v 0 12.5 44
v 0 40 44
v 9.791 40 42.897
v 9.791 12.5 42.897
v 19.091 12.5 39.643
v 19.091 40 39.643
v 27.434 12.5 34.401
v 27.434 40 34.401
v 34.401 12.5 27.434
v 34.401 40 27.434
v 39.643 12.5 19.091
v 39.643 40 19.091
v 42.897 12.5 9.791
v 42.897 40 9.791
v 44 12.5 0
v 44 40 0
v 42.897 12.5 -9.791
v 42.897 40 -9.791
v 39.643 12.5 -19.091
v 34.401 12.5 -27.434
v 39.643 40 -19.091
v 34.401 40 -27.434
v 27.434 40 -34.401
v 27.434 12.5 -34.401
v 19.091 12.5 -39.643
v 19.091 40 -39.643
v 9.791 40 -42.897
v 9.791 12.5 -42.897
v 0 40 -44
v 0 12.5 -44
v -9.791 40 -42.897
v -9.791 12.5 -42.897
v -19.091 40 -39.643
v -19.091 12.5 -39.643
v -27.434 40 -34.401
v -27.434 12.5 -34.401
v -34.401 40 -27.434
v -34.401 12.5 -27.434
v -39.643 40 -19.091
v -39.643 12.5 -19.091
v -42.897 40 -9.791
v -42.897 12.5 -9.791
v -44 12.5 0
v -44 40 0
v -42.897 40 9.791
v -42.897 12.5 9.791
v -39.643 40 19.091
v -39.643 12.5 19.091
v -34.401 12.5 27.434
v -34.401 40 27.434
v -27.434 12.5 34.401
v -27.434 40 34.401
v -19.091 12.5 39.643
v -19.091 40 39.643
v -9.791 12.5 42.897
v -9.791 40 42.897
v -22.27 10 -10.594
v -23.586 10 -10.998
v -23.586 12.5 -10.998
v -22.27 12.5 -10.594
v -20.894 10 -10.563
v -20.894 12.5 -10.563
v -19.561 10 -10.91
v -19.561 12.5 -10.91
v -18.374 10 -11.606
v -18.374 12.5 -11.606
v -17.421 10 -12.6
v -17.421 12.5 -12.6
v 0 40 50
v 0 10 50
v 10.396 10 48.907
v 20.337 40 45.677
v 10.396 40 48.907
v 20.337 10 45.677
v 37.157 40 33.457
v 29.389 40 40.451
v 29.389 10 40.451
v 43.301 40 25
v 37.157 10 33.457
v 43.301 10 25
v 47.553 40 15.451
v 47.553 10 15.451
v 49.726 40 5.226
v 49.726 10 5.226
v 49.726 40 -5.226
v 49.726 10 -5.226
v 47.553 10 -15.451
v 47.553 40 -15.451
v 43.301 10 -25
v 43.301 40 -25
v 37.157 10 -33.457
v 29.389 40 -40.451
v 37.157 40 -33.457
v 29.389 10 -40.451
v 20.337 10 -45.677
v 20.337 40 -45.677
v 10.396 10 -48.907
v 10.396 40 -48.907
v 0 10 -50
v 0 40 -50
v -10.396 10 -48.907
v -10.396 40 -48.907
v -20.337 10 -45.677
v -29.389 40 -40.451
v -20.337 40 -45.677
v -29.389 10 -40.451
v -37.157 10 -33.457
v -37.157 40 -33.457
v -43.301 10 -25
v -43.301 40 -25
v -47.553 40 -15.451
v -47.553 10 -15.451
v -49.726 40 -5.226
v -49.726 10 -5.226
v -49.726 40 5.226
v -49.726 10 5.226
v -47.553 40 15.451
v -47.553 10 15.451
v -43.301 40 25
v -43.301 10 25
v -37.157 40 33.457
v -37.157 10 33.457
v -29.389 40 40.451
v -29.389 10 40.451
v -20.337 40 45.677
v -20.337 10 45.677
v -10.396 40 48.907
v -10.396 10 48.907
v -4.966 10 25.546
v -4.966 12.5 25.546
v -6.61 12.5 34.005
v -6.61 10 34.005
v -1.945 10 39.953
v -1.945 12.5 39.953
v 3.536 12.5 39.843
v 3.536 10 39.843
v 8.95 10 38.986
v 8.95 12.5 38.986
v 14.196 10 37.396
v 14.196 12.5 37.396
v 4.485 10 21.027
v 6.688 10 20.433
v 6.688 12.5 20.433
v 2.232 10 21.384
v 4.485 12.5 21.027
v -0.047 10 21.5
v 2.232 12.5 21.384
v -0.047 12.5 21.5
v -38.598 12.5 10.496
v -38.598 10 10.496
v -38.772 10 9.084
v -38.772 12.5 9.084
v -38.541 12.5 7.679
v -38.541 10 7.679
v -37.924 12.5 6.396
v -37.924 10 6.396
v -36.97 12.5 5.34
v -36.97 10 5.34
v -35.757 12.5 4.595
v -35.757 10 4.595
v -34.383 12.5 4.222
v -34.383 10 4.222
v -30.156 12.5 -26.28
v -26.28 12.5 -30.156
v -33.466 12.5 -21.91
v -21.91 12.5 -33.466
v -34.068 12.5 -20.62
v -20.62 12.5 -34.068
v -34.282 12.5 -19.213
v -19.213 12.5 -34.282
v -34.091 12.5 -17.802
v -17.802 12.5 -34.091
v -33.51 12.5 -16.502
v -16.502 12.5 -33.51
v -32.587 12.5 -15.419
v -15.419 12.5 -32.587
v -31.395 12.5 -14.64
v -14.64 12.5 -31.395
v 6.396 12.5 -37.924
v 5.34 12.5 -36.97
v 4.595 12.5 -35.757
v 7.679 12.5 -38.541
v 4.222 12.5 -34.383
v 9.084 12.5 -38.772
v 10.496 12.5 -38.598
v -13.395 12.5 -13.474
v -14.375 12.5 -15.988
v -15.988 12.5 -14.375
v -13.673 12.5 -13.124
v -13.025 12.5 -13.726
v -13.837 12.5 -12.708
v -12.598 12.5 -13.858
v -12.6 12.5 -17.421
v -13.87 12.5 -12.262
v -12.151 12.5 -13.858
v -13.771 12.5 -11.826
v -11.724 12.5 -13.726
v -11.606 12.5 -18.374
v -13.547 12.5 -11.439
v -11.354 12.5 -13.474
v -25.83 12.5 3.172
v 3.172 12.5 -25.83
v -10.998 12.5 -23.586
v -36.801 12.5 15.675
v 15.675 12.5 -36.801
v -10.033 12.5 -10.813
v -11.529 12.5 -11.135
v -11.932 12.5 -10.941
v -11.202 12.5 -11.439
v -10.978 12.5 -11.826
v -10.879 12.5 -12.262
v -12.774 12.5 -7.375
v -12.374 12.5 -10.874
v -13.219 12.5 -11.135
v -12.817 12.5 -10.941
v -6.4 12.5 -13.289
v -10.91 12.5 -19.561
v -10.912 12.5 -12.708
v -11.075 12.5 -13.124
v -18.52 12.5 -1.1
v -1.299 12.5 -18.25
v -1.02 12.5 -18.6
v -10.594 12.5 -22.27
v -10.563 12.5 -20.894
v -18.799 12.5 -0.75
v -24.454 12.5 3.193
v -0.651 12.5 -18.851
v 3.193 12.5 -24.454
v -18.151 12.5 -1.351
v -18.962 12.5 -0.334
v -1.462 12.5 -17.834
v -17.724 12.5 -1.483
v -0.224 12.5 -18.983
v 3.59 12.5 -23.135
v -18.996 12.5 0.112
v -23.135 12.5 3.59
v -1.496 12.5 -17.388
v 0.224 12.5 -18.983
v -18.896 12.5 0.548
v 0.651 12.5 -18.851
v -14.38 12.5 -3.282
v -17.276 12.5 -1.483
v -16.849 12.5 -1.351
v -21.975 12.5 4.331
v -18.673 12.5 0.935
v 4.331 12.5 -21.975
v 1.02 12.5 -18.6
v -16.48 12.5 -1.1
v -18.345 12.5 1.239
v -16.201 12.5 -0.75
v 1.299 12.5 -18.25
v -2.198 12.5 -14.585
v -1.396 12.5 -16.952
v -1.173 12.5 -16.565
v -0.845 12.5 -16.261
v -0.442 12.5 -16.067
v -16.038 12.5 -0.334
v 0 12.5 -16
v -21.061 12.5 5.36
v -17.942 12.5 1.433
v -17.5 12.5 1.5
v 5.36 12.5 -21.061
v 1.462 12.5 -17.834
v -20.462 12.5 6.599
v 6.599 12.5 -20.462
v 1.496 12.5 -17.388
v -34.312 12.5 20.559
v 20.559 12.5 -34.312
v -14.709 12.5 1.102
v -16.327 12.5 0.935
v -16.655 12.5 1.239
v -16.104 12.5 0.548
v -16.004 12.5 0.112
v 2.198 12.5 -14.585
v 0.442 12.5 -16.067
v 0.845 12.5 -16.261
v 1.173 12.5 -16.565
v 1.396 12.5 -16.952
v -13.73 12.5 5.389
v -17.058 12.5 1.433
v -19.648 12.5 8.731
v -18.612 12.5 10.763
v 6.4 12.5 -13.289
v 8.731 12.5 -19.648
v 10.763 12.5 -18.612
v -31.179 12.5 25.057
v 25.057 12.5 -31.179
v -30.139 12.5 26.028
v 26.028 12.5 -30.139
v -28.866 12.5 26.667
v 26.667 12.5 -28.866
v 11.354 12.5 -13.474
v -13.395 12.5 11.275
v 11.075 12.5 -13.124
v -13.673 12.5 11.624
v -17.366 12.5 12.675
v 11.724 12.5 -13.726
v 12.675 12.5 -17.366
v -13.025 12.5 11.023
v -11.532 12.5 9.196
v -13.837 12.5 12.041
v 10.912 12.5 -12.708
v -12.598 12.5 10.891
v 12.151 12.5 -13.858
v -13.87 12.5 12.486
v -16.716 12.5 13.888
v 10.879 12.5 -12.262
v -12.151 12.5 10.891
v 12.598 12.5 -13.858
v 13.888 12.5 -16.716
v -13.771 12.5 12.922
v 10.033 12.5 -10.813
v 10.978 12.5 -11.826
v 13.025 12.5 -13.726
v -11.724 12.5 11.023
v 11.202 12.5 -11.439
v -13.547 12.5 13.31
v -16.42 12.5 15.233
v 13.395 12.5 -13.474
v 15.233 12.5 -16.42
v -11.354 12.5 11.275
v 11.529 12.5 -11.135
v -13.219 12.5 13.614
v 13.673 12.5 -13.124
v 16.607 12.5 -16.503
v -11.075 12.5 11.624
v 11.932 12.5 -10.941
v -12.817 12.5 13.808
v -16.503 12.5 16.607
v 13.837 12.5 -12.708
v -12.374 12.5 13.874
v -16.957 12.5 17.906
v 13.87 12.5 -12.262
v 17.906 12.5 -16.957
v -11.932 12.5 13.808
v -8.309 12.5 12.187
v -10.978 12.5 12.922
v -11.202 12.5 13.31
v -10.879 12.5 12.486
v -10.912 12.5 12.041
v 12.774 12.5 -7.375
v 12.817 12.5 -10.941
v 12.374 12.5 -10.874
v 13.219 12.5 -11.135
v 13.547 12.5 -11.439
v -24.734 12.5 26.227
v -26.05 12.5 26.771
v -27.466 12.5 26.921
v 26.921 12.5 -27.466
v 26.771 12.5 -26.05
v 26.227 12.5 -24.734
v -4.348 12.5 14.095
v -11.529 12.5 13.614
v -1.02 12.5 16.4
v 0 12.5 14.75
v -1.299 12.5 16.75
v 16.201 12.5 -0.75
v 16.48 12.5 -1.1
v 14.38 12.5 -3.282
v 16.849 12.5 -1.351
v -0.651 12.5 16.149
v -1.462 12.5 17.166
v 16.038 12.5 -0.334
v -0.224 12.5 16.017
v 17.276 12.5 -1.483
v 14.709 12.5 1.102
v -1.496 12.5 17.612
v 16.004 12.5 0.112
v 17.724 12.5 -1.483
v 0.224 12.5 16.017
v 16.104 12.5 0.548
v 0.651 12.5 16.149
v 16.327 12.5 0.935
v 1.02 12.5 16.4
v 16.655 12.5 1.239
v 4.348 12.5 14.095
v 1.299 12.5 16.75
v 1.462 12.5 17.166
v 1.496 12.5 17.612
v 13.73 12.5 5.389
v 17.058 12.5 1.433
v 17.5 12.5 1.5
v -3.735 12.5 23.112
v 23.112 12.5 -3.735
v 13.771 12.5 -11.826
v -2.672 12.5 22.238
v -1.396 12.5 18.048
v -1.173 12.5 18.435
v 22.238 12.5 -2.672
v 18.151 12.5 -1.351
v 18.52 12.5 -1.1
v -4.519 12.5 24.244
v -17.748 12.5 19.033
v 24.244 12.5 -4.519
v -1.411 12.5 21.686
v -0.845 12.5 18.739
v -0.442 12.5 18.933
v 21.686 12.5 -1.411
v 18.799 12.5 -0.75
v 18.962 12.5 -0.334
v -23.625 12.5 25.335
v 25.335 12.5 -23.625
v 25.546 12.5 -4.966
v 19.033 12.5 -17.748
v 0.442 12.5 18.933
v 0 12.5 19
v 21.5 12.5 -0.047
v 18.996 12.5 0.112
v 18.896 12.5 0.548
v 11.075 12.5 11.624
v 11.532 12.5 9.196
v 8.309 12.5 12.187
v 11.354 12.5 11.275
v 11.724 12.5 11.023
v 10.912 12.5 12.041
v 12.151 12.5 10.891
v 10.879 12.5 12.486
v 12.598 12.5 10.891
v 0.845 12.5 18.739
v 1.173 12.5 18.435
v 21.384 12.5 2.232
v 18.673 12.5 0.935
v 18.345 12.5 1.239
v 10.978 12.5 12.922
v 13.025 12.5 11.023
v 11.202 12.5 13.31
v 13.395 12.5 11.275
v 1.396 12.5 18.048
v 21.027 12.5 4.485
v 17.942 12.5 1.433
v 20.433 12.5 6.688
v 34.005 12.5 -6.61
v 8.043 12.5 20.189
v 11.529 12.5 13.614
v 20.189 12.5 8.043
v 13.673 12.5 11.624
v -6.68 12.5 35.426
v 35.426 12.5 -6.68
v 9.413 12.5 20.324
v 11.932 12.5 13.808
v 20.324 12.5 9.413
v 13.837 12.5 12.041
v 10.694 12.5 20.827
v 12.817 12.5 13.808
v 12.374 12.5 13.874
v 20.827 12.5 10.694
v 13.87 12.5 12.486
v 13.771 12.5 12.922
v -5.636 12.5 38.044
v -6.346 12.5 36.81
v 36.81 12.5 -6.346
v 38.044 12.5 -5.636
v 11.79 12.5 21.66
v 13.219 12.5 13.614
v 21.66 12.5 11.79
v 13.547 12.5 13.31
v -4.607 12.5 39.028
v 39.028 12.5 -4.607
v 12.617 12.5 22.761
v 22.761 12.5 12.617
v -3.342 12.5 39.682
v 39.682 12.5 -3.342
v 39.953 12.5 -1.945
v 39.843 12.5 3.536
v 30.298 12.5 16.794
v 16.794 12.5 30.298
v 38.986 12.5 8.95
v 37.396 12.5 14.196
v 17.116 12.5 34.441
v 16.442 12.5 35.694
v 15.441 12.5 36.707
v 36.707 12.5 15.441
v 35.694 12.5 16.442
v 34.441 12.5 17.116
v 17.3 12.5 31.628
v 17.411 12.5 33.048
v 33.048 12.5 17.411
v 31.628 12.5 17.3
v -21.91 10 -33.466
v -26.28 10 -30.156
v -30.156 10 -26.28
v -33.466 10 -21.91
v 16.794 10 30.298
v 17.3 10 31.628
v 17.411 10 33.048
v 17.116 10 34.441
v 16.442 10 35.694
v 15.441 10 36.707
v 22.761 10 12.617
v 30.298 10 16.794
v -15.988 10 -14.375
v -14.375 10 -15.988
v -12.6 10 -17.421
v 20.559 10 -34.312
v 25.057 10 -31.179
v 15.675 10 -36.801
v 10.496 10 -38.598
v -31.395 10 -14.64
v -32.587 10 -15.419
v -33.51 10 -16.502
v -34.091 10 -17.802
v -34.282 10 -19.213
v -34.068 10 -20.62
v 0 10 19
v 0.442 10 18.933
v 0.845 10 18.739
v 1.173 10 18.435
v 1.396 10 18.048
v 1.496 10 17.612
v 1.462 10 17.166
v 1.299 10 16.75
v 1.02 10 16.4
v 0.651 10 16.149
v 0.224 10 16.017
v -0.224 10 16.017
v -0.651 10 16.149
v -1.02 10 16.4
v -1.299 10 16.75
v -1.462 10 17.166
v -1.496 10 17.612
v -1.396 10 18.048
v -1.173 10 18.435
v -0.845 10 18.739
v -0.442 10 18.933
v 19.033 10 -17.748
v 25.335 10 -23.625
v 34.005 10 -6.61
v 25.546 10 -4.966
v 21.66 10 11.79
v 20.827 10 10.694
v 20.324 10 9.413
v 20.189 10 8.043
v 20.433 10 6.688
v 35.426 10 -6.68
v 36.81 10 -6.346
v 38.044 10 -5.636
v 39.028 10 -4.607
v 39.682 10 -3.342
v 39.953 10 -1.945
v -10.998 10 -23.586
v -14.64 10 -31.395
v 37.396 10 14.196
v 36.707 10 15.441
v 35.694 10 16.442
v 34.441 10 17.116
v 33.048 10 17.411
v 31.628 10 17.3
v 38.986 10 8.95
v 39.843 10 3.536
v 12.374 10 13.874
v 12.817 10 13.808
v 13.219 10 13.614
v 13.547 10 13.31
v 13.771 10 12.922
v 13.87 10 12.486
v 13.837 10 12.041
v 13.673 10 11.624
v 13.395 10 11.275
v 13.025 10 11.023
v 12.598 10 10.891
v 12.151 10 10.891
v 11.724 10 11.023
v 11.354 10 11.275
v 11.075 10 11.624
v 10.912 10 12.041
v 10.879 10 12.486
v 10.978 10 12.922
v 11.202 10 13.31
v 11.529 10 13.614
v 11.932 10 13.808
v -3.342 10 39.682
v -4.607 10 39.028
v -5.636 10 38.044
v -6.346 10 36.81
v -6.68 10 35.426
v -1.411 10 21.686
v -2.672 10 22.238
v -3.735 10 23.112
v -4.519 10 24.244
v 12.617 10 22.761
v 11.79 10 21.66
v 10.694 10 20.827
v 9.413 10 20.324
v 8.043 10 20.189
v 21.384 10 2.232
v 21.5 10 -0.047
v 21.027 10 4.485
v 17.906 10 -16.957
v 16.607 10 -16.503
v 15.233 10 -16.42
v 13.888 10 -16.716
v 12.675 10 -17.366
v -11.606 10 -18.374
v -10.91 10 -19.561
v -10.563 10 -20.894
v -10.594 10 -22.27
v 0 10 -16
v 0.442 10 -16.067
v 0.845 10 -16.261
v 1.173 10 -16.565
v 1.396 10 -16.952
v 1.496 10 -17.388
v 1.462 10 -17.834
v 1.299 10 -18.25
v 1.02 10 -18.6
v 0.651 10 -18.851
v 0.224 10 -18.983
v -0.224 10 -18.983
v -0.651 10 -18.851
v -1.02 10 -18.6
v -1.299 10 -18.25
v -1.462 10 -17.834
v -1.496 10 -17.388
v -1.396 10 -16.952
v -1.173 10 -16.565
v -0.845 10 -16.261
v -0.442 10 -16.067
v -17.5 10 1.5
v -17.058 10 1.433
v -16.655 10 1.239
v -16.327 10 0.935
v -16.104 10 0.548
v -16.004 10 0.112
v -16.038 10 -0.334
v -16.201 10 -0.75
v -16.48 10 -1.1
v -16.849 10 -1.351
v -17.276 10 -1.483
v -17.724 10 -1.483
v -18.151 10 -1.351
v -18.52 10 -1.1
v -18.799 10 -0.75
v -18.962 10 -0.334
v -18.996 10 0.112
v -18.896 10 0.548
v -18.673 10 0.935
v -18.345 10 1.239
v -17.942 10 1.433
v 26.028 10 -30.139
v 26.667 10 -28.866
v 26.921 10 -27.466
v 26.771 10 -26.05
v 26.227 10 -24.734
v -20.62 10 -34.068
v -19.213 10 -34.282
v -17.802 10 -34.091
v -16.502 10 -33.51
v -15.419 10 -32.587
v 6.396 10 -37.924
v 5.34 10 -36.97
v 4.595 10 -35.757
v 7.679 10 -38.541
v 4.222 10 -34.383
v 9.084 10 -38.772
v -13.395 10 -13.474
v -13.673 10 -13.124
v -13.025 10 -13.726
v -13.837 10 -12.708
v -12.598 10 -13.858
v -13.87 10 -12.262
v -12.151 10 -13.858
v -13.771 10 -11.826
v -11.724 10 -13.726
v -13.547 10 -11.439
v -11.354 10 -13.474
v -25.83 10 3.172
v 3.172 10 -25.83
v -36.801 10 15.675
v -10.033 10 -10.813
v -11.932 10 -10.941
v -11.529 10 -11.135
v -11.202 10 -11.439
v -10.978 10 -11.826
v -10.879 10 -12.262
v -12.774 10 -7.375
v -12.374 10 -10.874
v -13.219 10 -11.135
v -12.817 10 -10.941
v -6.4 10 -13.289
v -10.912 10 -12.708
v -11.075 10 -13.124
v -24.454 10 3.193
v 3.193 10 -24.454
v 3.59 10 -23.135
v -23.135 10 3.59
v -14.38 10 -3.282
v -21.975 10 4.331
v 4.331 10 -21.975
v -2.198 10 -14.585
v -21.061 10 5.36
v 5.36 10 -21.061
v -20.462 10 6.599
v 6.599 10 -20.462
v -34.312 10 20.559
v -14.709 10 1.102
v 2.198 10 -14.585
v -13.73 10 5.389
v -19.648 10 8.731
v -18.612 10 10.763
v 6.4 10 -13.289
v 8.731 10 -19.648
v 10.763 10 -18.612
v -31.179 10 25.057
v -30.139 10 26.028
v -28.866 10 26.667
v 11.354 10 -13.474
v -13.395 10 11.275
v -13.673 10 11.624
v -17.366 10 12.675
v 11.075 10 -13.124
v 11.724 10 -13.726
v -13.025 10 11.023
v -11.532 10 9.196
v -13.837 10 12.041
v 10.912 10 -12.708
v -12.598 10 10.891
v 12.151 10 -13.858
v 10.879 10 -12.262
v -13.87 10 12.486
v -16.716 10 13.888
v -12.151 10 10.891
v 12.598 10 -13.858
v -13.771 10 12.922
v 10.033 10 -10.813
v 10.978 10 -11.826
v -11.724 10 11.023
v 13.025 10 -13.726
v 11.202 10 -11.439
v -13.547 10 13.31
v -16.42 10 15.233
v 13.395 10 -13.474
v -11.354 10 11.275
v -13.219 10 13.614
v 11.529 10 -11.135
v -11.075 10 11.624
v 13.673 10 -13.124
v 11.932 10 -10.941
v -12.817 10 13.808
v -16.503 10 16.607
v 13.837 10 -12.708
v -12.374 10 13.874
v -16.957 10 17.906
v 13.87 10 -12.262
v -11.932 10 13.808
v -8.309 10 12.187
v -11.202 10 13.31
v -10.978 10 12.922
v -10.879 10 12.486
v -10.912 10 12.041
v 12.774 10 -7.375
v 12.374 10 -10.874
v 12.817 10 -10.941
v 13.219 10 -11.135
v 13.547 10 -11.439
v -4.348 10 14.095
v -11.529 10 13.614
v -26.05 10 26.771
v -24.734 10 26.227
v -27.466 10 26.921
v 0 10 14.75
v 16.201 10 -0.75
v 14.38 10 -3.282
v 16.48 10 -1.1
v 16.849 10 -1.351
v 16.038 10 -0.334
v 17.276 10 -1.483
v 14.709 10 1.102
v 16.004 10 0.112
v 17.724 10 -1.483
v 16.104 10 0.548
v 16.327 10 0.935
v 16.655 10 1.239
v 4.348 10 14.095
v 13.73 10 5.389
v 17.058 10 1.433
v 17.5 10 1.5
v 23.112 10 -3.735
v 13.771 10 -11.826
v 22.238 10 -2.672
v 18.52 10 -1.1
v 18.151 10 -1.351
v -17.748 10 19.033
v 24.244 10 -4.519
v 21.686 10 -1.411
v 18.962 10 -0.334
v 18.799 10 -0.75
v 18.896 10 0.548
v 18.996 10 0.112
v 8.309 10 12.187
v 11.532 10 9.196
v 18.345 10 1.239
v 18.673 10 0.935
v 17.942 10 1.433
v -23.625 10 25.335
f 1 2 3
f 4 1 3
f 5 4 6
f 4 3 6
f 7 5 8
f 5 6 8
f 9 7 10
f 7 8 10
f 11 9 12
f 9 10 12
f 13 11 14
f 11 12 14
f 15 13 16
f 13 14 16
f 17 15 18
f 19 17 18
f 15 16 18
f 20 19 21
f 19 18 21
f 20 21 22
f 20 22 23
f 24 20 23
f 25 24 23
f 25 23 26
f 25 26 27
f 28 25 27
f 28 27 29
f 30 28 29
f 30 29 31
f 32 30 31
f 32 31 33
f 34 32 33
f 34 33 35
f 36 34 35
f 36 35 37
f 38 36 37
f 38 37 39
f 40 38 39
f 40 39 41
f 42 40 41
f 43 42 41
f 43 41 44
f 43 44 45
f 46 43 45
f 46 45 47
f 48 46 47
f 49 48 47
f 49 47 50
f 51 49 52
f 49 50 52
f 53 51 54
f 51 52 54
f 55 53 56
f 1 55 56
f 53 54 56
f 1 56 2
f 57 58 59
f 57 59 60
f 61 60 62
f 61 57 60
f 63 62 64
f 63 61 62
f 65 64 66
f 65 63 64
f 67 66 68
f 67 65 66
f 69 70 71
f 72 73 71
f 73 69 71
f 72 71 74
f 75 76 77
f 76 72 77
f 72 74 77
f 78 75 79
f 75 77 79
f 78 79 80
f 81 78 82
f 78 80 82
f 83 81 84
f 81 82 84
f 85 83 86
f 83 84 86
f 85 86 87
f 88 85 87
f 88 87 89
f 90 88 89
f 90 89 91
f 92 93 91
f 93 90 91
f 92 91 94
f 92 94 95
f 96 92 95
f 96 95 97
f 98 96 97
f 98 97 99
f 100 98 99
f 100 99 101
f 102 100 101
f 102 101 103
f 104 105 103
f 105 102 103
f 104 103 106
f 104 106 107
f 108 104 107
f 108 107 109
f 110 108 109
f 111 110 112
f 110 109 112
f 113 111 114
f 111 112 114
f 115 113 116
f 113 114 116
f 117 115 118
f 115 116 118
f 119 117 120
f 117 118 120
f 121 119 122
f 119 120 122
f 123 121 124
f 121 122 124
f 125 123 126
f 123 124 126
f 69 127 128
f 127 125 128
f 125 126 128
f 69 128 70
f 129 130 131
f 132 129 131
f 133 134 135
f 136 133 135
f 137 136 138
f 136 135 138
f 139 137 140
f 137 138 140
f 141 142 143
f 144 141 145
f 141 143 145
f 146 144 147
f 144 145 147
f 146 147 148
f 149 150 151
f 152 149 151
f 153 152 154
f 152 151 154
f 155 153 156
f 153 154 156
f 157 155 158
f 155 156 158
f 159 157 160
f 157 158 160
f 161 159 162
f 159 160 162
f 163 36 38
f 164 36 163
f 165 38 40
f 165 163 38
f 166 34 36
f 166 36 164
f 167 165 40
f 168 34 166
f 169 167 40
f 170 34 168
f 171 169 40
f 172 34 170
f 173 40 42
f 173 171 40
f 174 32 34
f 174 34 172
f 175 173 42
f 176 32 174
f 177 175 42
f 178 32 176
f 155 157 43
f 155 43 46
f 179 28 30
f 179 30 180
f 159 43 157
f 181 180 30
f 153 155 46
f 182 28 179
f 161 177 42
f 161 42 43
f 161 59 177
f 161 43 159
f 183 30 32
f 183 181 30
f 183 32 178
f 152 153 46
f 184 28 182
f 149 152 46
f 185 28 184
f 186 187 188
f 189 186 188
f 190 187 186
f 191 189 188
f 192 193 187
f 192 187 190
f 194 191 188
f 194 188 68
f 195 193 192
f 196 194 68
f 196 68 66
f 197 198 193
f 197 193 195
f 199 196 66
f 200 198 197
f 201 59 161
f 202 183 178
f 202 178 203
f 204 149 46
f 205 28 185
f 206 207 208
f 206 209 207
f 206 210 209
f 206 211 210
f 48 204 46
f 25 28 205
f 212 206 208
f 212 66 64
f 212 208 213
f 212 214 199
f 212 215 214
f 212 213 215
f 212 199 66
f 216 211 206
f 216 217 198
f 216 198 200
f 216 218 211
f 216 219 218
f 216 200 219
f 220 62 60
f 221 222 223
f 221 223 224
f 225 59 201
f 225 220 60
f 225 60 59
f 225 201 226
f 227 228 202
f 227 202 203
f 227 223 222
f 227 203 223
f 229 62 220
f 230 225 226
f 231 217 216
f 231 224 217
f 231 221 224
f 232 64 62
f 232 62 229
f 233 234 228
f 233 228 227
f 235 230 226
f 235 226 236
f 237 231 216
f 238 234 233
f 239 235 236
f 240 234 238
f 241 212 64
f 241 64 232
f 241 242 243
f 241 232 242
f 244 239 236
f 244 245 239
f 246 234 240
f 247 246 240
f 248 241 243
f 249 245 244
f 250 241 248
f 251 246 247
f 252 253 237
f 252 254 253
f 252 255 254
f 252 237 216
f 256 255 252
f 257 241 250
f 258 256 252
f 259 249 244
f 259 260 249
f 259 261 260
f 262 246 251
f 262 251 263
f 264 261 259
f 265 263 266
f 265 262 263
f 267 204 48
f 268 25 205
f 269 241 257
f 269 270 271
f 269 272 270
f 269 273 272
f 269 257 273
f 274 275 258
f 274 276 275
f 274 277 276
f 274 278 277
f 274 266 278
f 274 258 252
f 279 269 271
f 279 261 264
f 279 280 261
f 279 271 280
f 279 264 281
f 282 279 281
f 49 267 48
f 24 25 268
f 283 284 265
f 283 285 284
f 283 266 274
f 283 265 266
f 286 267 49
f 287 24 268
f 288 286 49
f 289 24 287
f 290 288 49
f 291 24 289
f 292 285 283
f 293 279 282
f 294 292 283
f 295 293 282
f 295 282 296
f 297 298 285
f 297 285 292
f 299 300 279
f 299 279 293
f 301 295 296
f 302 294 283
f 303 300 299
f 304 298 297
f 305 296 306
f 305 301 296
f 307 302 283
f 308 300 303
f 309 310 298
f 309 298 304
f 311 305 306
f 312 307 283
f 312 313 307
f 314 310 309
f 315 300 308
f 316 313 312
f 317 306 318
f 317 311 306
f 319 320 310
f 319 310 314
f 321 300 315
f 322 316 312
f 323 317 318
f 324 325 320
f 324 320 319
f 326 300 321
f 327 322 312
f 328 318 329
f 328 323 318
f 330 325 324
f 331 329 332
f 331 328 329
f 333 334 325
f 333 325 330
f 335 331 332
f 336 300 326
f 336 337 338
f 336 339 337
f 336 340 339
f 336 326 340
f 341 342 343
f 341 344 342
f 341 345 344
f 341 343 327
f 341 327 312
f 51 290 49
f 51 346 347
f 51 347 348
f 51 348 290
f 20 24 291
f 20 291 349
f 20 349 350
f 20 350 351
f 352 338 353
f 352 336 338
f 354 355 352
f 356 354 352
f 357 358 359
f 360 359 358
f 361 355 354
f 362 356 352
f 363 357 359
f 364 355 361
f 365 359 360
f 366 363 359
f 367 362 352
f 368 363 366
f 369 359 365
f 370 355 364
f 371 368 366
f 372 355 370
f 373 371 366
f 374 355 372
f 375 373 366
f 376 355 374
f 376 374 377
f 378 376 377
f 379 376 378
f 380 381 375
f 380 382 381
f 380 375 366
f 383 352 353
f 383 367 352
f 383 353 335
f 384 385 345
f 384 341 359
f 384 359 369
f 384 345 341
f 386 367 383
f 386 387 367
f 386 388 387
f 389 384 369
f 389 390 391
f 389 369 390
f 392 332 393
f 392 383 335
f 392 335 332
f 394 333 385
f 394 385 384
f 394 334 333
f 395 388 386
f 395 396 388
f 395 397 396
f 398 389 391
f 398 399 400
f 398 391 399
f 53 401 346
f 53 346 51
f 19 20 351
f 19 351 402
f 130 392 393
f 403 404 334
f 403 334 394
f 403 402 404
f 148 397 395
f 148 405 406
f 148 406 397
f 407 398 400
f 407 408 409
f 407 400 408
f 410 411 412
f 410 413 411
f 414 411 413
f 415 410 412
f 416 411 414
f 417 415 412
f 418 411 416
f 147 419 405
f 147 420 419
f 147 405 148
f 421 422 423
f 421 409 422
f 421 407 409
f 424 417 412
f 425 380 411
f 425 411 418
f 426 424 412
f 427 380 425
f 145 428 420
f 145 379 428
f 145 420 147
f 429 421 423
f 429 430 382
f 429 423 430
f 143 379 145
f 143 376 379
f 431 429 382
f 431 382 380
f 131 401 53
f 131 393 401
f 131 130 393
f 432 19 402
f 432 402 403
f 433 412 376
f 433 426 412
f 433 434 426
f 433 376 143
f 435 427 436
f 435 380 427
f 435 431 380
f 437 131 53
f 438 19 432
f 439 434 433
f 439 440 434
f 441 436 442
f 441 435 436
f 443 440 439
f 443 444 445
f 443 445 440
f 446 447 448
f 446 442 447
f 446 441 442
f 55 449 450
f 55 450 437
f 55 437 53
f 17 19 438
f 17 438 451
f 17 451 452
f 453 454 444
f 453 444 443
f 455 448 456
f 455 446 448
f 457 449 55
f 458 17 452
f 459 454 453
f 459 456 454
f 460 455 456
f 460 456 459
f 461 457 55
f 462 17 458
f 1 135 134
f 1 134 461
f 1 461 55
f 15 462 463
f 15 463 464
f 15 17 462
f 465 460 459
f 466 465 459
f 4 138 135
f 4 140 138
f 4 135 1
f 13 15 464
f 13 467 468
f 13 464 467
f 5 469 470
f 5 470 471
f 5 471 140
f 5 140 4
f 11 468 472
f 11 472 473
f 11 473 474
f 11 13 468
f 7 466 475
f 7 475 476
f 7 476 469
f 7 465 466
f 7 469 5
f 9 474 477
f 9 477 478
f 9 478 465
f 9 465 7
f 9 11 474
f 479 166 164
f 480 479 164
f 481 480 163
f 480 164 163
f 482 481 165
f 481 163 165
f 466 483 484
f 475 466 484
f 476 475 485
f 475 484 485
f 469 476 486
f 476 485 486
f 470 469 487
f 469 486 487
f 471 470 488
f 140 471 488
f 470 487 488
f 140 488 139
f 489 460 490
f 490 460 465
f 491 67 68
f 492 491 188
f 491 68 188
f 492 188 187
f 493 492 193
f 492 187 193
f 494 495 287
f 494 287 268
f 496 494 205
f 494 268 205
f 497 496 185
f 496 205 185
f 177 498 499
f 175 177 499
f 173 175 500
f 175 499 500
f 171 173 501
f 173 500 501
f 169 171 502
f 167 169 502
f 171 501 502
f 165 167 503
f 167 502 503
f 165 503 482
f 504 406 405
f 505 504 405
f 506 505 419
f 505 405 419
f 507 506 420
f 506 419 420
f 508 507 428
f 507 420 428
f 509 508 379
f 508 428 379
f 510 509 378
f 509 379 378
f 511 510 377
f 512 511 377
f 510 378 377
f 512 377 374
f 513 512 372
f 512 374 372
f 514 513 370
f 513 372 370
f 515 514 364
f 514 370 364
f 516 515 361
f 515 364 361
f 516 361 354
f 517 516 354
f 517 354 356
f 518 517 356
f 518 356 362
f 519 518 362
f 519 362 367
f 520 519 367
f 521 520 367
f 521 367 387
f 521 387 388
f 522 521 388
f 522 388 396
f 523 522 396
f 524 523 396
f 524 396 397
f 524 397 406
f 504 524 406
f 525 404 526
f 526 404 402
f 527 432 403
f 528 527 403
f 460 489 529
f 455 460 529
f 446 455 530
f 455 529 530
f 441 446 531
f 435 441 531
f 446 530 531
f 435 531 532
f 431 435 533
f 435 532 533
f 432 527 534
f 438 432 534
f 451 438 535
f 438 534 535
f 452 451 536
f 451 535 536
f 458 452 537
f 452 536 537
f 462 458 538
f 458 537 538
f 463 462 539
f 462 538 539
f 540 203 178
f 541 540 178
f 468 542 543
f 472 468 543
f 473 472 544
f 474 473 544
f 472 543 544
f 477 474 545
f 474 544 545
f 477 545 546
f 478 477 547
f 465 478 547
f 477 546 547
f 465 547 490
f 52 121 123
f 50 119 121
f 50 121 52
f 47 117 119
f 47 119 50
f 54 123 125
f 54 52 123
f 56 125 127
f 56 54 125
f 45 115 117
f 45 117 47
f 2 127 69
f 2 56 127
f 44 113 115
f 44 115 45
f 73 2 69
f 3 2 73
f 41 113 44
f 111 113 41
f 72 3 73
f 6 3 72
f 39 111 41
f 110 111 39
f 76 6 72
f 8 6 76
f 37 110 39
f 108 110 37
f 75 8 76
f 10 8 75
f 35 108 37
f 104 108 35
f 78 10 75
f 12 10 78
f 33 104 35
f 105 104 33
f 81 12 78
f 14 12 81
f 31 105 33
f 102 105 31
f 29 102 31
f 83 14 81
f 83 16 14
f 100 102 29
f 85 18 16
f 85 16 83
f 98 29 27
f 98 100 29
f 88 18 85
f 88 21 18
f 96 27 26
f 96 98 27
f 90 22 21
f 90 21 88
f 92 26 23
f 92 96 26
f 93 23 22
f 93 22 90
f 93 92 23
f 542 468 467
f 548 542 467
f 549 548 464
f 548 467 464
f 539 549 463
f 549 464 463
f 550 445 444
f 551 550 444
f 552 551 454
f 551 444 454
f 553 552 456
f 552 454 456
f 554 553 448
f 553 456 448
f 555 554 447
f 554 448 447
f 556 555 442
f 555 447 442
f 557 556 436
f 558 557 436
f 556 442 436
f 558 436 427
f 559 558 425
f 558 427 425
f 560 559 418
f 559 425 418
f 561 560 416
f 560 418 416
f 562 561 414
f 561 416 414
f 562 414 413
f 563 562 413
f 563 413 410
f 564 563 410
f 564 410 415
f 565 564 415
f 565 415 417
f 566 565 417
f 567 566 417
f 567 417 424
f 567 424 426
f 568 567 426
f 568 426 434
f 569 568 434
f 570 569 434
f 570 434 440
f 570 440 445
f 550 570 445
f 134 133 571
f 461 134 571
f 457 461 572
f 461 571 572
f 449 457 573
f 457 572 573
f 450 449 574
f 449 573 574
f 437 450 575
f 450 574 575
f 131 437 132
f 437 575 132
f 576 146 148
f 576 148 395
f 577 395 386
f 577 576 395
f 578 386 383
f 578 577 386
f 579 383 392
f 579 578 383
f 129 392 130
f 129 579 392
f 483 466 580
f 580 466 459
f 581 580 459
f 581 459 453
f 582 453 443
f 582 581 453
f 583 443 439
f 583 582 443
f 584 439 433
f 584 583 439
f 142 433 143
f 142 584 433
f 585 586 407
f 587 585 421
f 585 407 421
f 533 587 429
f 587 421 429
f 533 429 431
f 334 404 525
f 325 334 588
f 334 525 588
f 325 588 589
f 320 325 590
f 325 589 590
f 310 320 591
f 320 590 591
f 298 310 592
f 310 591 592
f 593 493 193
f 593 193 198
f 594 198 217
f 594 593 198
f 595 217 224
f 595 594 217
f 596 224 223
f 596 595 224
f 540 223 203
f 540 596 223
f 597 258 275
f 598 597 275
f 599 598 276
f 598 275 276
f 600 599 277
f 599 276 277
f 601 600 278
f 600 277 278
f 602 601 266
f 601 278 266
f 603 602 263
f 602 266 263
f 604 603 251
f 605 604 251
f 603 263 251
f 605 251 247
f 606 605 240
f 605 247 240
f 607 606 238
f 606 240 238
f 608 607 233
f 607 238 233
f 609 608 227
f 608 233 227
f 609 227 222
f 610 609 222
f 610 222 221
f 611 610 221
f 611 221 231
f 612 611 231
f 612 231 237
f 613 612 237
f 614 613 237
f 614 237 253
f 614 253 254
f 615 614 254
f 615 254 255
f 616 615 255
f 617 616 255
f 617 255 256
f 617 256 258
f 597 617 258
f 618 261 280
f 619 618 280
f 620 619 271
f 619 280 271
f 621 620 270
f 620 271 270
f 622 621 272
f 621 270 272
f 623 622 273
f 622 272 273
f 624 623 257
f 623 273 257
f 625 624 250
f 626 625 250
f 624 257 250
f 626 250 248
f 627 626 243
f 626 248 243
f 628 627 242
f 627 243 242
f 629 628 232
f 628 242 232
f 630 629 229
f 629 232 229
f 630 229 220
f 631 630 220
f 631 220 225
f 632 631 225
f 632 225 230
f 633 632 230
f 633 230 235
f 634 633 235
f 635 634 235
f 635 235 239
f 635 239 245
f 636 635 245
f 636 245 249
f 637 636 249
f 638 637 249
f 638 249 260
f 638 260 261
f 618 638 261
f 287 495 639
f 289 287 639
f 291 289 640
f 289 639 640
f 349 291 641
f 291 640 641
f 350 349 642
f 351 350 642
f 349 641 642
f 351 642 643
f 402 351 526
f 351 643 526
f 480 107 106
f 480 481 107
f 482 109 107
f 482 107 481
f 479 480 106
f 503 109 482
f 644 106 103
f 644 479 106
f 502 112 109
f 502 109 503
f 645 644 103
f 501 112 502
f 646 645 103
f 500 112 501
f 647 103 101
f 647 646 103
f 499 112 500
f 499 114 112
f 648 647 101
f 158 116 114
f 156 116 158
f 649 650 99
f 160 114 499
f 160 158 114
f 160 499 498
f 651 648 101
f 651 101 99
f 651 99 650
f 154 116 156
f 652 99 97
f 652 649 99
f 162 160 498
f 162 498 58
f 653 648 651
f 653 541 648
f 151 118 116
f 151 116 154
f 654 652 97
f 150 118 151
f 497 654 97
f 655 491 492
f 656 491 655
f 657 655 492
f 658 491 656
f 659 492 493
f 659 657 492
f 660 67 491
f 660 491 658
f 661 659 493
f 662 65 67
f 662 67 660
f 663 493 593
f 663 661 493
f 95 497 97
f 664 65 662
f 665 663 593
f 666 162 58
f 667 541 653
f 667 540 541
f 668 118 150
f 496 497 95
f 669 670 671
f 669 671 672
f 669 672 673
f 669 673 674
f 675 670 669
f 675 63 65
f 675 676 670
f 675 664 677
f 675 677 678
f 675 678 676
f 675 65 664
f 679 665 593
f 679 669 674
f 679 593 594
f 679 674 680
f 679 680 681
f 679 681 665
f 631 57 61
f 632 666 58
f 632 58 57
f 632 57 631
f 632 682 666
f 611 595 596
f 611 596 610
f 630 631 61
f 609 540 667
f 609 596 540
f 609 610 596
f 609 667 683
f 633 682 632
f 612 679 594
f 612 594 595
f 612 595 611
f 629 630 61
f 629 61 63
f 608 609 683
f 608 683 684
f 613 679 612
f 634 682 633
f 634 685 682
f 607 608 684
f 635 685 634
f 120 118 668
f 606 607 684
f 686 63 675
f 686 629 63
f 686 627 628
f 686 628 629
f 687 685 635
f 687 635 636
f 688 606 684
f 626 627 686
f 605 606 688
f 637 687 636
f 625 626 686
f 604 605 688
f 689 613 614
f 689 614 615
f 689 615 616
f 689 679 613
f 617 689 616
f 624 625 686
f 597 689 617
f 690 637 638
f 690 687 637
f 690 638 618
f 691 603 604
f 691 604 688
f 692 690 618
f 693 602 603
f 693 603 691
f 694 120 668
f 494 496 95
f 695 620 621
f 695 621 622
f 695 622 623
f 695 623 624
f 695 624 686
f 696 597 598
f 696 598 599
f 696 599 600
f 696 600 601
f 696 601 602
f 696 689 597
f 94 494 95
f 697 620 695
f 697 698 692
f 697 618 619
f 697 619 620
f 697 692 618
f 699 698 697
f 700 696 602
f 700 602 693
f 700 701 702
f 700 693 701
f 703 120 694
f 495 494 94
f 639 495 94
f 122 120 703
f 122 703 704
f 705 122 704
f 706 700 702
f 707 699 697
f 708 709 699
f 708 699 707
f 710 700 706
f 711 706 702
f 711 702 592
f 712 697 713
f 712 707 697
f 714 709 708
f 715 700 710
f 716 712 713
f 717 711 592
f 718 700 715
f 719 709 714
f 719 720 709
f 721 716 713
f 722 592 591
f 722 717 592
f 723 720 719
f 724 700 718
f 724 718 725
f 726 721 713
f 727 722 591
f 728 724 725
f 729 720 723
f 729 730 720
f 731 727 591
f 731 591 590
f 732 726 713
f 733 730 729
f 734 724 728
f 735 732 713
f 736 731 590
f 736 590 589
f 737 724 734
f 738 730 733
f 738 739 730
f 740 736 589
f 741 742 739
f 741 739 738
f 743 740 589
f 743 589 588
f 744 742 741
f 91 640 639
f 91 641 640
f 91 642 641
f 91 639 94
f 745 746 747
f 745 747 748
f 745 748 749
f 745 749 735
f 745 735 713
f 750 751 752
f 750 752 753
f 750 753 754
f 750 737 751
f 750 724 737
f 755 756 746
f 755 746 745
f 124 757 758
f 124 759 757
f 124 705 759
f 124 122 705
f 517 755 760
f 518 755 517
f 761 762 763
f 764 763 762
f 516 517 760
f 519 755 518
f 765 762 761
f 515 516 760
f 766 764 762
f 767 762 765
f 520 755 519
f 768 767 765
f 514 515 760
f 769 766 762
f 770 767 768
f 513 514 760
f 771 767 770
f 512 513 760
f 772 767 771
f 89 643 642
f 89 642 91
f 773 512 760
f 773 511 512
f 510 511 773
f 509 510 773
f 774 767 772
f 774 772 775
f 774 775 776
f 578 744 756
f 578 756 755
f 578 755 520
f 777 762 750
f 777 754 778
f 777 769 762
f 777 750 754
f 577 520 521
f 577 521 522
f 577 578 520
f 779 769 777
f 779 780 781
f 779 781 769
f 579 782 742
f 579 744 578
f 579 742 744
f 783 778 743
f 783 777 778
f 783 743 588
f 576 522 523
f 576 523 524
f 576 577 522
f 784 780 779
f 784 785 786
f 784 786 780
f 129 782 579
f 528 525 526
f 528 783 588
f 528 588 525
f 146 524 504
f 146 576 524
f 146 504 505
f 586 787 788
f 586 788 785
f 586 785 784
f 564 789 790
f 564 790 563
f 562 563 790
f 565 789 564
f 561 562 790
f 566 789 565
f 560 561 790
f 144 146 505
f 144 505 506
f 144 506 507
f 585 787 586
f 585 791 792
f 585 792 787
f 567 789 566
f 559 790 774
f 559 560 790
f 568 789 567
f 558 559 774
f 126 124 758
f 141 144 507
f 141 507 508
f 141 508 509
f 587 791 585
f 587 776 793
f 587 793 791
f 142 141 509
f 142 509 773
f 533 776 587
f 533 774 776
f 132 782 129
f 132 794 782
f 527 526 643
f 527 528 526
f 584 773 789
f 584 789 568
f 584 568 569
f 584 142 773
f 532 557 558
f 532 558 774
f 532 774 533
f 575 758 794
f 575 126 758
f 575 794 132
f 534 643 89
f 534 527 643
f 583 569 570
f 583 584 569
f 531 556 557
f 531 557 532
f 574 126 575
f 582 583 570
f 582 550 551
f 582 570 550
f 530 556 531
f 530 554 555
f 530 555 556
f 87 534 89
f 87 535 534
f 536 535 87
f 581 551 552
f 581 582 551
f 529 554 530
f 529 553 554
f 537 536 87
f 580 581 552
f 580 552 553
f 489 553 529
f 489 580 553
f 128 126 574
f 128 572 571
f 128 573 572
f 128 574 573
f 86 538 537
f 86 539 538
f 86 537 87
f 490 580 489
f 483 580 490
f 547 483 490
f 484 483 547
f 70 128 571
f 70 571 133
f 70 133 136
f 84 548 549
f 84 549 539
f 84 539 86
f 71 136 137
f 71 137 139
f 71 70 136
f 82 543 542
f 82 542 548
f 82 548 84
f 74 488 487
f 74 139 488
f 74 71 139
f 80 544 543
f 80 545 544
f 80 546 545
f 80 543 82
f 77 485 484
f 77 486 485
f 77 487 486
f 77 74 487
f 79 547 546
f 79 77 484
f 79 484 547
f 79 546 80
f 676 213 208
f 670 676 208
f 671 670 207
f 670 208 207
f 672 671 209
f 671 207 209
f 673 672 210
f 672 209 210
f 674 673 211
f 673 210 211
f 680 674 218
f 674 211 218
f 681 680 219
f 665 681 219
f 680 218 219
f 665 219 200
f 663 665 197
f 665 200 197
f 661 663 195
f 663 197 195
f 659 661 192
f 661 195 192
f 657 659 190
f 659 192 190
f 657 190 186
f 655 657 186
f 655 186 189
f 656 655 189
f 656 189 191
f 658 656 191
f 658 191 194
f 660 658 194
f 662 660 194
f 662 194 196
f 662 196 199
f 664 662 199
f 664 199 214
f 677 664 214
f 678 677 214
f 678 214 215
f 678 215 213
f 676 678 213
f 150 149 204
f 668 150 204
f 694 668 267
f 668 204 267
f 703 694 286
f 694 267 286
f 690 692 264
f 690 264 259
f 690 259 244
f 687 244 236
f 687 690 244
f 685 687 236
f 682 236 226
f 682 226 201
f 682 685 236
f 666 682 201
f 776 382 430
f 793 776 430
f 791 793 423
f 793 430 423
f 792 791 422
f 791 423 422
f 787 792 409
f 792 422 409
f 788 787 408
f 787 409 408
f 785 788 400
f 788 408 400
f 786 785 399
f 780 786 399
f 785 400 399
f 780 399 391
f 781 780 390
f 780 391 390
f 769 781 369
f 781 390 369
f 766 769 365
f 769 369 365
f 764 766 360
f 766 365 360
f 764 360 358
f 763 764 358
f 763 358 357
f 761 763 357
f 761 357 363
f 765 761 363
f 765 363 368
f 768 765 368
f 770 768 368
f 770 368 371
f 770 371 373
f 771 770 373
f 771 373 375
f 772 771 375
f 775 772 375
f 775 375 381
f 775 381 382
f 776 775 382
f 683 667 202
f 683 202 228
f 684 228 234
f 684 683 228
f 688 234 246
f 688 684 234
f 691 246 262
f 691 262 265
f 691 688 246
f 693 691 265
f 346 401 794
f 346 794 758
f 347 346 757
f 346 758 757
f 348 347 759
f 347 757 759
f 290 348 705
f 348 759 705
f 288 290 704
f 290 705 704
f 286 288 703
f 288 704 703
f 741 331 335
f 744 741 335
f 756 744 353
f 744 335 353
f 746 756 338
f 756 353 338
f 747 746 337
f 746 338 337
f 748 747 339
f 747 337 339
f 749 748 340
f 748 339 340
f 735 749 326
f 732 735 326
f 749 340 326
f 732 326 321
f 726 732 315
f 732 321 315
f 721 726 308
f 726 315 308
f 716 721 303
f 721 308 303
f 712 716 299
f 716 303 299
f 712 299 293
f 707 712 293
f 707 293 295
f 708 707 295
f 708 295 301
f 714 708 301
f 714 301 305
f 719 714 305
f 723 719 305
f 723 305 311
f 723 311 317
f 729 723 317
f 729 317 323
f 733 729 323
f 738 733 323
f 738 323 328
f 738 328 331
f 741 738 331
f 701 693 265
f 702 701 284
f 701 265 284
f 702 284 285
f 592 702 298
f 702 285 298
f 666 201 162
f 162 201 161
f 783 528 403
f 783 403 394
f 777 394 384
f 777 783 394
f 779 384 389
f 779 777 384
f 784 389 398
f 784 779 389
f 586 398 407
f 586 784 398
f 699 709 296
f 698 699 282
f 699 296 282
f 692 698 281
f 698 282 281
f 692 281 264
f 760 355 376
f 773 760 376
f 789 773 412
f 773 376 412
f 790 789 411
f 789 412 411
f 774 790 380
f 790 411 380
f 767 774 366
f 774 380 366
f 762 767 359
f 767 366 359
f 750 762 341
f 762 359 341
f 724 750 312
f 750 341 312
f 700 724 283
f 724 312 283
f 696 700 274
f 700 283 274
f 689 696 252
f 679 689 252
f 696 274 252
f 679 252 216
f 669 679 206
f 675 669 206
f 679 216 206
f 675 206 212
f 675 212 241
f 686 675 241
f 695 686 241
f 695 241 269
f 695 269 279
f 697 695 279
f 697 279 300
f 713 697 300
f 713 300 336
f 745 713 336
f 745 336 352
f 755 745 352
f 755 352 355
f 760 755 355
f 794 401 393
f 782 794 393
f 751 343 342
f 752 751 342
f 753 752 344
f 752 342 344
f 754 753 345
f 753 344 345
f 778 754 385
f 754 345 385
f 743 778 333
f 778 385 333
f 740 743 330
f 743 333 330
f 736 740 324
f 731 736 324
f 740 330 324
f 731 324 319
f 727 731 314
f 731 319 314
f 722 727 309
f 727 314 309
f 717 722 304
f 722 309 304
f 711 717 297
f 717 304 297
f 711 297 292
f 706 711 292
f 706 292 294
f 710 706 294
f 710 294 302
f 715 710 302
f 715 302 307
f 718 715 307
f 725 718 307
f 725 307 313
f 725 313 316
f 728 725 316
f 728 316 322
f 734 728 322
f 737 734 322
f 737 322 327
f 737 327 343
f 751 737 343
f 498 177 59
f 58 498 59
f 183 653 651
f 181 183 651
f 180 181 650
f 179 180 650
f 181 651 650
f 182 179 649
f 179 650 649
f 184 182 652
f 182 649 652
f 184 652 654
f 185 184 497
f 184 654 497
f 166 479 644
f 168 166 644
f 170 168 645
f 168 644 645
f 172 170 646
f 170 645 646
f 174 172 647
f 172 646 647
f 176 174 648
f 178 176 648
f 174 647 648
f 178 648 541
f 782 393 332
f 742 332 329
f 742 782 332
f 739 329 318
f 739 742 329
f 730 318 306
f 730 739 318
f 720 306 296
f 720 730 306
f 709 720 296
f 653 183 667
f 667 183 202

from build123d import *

# Parameters (mm, degrees)
SKETCH_1_R                       = 50
EXTRUDE_1_DEPTH                  = 50
SKETCH_2_R                       = 44
CUT_EXTRUDE_1_DEPTH              = 37.5
CUT_EXTRUDE_START                = -9.5
SKETCH_3_R                       = 44
CUT_EXTRUDE_2_DEPTH              = 9.5
SKETCH_4_R                       = 14.75
SKETCH_4_R_2                     = 1.5
CUT_EXTRUDE_3_DEPTH              = 4
CUT_EXTRUDE_4_DEPTH              = 4
FILLET_1_R                       = 5
PATTERN_CIRCULAR_1_COUNT         = 5
FILLET_1_OF_PATTERN_CIRCULAR_1_R = 5
SKETCH_11_R                      = 59.165085767
CUT_EXTRUDE_8_DEPTH              = 10
SKETCH_15_R                      = 58.048743464
CUT_EXTRUDE_10_DEPTH             = 10


with BuildPart() as part:
    # 草图1 → 凸台-拉伸1 (new body)
    with BuildSketch(Plane(origin=(0, 0, 0), x_dir=(1, 0, 0), z_dir=(0, 1, 0))):
        with Locations(Location((0, 0, 0), (0, 0, 270))):
            Circle(SKETCH_1_R)
    extrude(amount=EXTRUDE_1_DEPTH)

    # 草图2 → 切除-拉伸1 (cut)
    with BuildSketch(Plane(origin=(0, 50, 0), x_dir=(1, 0, 0), z_dir=(0, 1, 0))):
        with Locations(Location((0, 0, 0), (0, 0, 270))):
            Circle(SKETCH_2_R)
    extrude(amount=-CUT_EXTRUDE_1_DEPTH, mode=Mode.SUBTRACT)

    # 草图3 → 切除-拉伸2 (cut)
    with BuildSketch(Plane.XZ.offset(CUT_EXTRUDE_START)):
        with Locations(Location((0, 0, 0), (0, 0, 90))):
            Circle(SKETCH_3_R)
    extrude(amount=CUT_EXTRUDE_2_DEPTH, mode=Mode.SUBTRACT)

    # 草图4 → 切除-拉伸3 (cut)
    with BuildSketch(Plane(origin=(0, 12.5, 0), x_dir=(1, 0, 0), z_dir=(0, 1, 0))):
        with Locations(Location((0, 0, 0), (0, 0, 270))):
            Circle(SKETCH_4_R)
        with Locations(Location((0, 17.5, 0), (0, 0, 270))):
            Circle(SKETCH_4_R_2)
        with Locations(Location((12.374368671, 12.374368671, 0), (0, 0, 270))):
            Circle(SKETCH_4_R_2)
        with Locations(Location((17.5, 0, 0), (0, 0, 270))):
            Circle(SKETCH_4_R_2)
        with Locations(Location((12.374368671, -12.374368671, 0), (0, 0, 270))):
            Circle(SKETCH_4_R_2)
        with Locations(Location((0, -17.5, 0), (0, 0, 270))):
            Circle(SKETCH_4_R_2)
        with Locations(Location((-12.374368671, -12.374368671, 0), (0, 0, 270))):
            Circle(SKETCH_4_R_2)
        with Locations(Location((-17.5, 0, 0), (0, 0, 270))):
            Circle(SKETCH_4_R_2)
        with Locations(Location((-12.374368671, 12.374368671, 0), (0, 0, 270))):
            Circle(SKETCH_4_R_2)
    extrude(amount=-CUT_EXTRUDE_3_DEPTH, mode=Mode.SUBTRACT)

    # 草图8 → 切除-拉伸4 (cut)
    with BuildSketch(Plane(origin=(0, 12.5, 0), x_dir=(1, 0, 0), z_dir=(0, 1, 0))):
        with BuildLine():
            Line((4.874773736, 39.701846066), (2.620190883, 21.33974226))
            ThreePointArc((2.620190883, 21.33974226), (9.760795744, 19.15664027), (15.724104585, 14.662964741))
            Line((15.724104585, 14.662964741), (29.254148065, 27.279934402))
            ThreePointArc((29.254148065, 27.279934402), (18.15961999, 35.640260968), (4.874773736, 39.701846066))
        make_face()
    cut_extrude_4 = extrude(amount=-CUT_EXTRUDE_4_DEPTH, mode=Mode.SUBTRACT)

    # 圆角1
    fillet_1_edges = [part.edges().sort_by_distance(p)[0] for p in [
        (29.254148065, 11, -27.279934402),
        (15.724104585, 11, -14.662964741),
        (2.620190883, 11, -21.33974226),
        (4.874773736, 11, -39.701846066),
    ]]
    fillet(fillet_1_edges, radius=FILLET_1_R)

    # 阵列(圆周)1: 切除-拉伸4 ×5 about axis
    pattern_circular_1_axis = Axis((0, 0, 0), (0, 1, 0))
    for i in range(1, PATTERN_CIRCULAR_1_COUNT):
        add(cut_extrude_4.rotate(pattern_circular_1_axis, i * 360 / PATTERN_CIRCULAR_1_COUNT), mode=Mode.SUBTRACT)

    # 圆角1 of 阵列(圆周)1
    fillet_1_of_pattern_circular_1_edges = [part.edges().sort_by_distance(p)[0] for p in [
        (-16.90473047, 11, -36.252311481),
        (-9.086292627, 11, -19.485617421),
        (-19.485617421, 11, -9.086292627),
        (-36.252311481, 11, -16.90473047),
        (-39.701846066, 11, 4.874773736),
        (-21.33974226, 11, 2.620190883),
        (-14.662964741, 11, 15.724104585),
        (-27.279934402, 11, 29.254148065),
        (-7.632359815, 11, 39.265087338),
        (-4.102393401, 11, 21.104984444),
        (10.423406835, 11, 18.804323703),
        (19.39238481, 11, 34.984788286),
        (34.984788286, 11, 19.39238481),
        (18.804323703, 11, 10.423406835),
        (21.104984444, 11, -4.102393401),
        (39.265087338, 11, -7.632359815),
    ]]
    fillet(fillet_1_of_pattern_circular_1_edges, radius=FILLET_1_OF_PATTERN_CIRCULAR_1_R)

    # 草图11 → 切除-拉伸8 (cut)
    with BuildSketch(Plane.XZ):
        Circle(SKETCH_11_R)
    extrude(amount=-CUT_EXTRUDE_8_DEPTH, mode=Mode.SUBTRACT)

    # 草图15 → 切除-拉伸10 (cut)
    with BuildSketch(Plane(origin=(0, 50, 0), x_dir=(1, 0, 0), z_dir=(0, 1, 0))):
        Circle(SKETCH_15_R)
    extrude(amount=-CUT_EXTRUDE_10_DEPTH, mode=Mode.SUBTRACT)


solid = part.part
